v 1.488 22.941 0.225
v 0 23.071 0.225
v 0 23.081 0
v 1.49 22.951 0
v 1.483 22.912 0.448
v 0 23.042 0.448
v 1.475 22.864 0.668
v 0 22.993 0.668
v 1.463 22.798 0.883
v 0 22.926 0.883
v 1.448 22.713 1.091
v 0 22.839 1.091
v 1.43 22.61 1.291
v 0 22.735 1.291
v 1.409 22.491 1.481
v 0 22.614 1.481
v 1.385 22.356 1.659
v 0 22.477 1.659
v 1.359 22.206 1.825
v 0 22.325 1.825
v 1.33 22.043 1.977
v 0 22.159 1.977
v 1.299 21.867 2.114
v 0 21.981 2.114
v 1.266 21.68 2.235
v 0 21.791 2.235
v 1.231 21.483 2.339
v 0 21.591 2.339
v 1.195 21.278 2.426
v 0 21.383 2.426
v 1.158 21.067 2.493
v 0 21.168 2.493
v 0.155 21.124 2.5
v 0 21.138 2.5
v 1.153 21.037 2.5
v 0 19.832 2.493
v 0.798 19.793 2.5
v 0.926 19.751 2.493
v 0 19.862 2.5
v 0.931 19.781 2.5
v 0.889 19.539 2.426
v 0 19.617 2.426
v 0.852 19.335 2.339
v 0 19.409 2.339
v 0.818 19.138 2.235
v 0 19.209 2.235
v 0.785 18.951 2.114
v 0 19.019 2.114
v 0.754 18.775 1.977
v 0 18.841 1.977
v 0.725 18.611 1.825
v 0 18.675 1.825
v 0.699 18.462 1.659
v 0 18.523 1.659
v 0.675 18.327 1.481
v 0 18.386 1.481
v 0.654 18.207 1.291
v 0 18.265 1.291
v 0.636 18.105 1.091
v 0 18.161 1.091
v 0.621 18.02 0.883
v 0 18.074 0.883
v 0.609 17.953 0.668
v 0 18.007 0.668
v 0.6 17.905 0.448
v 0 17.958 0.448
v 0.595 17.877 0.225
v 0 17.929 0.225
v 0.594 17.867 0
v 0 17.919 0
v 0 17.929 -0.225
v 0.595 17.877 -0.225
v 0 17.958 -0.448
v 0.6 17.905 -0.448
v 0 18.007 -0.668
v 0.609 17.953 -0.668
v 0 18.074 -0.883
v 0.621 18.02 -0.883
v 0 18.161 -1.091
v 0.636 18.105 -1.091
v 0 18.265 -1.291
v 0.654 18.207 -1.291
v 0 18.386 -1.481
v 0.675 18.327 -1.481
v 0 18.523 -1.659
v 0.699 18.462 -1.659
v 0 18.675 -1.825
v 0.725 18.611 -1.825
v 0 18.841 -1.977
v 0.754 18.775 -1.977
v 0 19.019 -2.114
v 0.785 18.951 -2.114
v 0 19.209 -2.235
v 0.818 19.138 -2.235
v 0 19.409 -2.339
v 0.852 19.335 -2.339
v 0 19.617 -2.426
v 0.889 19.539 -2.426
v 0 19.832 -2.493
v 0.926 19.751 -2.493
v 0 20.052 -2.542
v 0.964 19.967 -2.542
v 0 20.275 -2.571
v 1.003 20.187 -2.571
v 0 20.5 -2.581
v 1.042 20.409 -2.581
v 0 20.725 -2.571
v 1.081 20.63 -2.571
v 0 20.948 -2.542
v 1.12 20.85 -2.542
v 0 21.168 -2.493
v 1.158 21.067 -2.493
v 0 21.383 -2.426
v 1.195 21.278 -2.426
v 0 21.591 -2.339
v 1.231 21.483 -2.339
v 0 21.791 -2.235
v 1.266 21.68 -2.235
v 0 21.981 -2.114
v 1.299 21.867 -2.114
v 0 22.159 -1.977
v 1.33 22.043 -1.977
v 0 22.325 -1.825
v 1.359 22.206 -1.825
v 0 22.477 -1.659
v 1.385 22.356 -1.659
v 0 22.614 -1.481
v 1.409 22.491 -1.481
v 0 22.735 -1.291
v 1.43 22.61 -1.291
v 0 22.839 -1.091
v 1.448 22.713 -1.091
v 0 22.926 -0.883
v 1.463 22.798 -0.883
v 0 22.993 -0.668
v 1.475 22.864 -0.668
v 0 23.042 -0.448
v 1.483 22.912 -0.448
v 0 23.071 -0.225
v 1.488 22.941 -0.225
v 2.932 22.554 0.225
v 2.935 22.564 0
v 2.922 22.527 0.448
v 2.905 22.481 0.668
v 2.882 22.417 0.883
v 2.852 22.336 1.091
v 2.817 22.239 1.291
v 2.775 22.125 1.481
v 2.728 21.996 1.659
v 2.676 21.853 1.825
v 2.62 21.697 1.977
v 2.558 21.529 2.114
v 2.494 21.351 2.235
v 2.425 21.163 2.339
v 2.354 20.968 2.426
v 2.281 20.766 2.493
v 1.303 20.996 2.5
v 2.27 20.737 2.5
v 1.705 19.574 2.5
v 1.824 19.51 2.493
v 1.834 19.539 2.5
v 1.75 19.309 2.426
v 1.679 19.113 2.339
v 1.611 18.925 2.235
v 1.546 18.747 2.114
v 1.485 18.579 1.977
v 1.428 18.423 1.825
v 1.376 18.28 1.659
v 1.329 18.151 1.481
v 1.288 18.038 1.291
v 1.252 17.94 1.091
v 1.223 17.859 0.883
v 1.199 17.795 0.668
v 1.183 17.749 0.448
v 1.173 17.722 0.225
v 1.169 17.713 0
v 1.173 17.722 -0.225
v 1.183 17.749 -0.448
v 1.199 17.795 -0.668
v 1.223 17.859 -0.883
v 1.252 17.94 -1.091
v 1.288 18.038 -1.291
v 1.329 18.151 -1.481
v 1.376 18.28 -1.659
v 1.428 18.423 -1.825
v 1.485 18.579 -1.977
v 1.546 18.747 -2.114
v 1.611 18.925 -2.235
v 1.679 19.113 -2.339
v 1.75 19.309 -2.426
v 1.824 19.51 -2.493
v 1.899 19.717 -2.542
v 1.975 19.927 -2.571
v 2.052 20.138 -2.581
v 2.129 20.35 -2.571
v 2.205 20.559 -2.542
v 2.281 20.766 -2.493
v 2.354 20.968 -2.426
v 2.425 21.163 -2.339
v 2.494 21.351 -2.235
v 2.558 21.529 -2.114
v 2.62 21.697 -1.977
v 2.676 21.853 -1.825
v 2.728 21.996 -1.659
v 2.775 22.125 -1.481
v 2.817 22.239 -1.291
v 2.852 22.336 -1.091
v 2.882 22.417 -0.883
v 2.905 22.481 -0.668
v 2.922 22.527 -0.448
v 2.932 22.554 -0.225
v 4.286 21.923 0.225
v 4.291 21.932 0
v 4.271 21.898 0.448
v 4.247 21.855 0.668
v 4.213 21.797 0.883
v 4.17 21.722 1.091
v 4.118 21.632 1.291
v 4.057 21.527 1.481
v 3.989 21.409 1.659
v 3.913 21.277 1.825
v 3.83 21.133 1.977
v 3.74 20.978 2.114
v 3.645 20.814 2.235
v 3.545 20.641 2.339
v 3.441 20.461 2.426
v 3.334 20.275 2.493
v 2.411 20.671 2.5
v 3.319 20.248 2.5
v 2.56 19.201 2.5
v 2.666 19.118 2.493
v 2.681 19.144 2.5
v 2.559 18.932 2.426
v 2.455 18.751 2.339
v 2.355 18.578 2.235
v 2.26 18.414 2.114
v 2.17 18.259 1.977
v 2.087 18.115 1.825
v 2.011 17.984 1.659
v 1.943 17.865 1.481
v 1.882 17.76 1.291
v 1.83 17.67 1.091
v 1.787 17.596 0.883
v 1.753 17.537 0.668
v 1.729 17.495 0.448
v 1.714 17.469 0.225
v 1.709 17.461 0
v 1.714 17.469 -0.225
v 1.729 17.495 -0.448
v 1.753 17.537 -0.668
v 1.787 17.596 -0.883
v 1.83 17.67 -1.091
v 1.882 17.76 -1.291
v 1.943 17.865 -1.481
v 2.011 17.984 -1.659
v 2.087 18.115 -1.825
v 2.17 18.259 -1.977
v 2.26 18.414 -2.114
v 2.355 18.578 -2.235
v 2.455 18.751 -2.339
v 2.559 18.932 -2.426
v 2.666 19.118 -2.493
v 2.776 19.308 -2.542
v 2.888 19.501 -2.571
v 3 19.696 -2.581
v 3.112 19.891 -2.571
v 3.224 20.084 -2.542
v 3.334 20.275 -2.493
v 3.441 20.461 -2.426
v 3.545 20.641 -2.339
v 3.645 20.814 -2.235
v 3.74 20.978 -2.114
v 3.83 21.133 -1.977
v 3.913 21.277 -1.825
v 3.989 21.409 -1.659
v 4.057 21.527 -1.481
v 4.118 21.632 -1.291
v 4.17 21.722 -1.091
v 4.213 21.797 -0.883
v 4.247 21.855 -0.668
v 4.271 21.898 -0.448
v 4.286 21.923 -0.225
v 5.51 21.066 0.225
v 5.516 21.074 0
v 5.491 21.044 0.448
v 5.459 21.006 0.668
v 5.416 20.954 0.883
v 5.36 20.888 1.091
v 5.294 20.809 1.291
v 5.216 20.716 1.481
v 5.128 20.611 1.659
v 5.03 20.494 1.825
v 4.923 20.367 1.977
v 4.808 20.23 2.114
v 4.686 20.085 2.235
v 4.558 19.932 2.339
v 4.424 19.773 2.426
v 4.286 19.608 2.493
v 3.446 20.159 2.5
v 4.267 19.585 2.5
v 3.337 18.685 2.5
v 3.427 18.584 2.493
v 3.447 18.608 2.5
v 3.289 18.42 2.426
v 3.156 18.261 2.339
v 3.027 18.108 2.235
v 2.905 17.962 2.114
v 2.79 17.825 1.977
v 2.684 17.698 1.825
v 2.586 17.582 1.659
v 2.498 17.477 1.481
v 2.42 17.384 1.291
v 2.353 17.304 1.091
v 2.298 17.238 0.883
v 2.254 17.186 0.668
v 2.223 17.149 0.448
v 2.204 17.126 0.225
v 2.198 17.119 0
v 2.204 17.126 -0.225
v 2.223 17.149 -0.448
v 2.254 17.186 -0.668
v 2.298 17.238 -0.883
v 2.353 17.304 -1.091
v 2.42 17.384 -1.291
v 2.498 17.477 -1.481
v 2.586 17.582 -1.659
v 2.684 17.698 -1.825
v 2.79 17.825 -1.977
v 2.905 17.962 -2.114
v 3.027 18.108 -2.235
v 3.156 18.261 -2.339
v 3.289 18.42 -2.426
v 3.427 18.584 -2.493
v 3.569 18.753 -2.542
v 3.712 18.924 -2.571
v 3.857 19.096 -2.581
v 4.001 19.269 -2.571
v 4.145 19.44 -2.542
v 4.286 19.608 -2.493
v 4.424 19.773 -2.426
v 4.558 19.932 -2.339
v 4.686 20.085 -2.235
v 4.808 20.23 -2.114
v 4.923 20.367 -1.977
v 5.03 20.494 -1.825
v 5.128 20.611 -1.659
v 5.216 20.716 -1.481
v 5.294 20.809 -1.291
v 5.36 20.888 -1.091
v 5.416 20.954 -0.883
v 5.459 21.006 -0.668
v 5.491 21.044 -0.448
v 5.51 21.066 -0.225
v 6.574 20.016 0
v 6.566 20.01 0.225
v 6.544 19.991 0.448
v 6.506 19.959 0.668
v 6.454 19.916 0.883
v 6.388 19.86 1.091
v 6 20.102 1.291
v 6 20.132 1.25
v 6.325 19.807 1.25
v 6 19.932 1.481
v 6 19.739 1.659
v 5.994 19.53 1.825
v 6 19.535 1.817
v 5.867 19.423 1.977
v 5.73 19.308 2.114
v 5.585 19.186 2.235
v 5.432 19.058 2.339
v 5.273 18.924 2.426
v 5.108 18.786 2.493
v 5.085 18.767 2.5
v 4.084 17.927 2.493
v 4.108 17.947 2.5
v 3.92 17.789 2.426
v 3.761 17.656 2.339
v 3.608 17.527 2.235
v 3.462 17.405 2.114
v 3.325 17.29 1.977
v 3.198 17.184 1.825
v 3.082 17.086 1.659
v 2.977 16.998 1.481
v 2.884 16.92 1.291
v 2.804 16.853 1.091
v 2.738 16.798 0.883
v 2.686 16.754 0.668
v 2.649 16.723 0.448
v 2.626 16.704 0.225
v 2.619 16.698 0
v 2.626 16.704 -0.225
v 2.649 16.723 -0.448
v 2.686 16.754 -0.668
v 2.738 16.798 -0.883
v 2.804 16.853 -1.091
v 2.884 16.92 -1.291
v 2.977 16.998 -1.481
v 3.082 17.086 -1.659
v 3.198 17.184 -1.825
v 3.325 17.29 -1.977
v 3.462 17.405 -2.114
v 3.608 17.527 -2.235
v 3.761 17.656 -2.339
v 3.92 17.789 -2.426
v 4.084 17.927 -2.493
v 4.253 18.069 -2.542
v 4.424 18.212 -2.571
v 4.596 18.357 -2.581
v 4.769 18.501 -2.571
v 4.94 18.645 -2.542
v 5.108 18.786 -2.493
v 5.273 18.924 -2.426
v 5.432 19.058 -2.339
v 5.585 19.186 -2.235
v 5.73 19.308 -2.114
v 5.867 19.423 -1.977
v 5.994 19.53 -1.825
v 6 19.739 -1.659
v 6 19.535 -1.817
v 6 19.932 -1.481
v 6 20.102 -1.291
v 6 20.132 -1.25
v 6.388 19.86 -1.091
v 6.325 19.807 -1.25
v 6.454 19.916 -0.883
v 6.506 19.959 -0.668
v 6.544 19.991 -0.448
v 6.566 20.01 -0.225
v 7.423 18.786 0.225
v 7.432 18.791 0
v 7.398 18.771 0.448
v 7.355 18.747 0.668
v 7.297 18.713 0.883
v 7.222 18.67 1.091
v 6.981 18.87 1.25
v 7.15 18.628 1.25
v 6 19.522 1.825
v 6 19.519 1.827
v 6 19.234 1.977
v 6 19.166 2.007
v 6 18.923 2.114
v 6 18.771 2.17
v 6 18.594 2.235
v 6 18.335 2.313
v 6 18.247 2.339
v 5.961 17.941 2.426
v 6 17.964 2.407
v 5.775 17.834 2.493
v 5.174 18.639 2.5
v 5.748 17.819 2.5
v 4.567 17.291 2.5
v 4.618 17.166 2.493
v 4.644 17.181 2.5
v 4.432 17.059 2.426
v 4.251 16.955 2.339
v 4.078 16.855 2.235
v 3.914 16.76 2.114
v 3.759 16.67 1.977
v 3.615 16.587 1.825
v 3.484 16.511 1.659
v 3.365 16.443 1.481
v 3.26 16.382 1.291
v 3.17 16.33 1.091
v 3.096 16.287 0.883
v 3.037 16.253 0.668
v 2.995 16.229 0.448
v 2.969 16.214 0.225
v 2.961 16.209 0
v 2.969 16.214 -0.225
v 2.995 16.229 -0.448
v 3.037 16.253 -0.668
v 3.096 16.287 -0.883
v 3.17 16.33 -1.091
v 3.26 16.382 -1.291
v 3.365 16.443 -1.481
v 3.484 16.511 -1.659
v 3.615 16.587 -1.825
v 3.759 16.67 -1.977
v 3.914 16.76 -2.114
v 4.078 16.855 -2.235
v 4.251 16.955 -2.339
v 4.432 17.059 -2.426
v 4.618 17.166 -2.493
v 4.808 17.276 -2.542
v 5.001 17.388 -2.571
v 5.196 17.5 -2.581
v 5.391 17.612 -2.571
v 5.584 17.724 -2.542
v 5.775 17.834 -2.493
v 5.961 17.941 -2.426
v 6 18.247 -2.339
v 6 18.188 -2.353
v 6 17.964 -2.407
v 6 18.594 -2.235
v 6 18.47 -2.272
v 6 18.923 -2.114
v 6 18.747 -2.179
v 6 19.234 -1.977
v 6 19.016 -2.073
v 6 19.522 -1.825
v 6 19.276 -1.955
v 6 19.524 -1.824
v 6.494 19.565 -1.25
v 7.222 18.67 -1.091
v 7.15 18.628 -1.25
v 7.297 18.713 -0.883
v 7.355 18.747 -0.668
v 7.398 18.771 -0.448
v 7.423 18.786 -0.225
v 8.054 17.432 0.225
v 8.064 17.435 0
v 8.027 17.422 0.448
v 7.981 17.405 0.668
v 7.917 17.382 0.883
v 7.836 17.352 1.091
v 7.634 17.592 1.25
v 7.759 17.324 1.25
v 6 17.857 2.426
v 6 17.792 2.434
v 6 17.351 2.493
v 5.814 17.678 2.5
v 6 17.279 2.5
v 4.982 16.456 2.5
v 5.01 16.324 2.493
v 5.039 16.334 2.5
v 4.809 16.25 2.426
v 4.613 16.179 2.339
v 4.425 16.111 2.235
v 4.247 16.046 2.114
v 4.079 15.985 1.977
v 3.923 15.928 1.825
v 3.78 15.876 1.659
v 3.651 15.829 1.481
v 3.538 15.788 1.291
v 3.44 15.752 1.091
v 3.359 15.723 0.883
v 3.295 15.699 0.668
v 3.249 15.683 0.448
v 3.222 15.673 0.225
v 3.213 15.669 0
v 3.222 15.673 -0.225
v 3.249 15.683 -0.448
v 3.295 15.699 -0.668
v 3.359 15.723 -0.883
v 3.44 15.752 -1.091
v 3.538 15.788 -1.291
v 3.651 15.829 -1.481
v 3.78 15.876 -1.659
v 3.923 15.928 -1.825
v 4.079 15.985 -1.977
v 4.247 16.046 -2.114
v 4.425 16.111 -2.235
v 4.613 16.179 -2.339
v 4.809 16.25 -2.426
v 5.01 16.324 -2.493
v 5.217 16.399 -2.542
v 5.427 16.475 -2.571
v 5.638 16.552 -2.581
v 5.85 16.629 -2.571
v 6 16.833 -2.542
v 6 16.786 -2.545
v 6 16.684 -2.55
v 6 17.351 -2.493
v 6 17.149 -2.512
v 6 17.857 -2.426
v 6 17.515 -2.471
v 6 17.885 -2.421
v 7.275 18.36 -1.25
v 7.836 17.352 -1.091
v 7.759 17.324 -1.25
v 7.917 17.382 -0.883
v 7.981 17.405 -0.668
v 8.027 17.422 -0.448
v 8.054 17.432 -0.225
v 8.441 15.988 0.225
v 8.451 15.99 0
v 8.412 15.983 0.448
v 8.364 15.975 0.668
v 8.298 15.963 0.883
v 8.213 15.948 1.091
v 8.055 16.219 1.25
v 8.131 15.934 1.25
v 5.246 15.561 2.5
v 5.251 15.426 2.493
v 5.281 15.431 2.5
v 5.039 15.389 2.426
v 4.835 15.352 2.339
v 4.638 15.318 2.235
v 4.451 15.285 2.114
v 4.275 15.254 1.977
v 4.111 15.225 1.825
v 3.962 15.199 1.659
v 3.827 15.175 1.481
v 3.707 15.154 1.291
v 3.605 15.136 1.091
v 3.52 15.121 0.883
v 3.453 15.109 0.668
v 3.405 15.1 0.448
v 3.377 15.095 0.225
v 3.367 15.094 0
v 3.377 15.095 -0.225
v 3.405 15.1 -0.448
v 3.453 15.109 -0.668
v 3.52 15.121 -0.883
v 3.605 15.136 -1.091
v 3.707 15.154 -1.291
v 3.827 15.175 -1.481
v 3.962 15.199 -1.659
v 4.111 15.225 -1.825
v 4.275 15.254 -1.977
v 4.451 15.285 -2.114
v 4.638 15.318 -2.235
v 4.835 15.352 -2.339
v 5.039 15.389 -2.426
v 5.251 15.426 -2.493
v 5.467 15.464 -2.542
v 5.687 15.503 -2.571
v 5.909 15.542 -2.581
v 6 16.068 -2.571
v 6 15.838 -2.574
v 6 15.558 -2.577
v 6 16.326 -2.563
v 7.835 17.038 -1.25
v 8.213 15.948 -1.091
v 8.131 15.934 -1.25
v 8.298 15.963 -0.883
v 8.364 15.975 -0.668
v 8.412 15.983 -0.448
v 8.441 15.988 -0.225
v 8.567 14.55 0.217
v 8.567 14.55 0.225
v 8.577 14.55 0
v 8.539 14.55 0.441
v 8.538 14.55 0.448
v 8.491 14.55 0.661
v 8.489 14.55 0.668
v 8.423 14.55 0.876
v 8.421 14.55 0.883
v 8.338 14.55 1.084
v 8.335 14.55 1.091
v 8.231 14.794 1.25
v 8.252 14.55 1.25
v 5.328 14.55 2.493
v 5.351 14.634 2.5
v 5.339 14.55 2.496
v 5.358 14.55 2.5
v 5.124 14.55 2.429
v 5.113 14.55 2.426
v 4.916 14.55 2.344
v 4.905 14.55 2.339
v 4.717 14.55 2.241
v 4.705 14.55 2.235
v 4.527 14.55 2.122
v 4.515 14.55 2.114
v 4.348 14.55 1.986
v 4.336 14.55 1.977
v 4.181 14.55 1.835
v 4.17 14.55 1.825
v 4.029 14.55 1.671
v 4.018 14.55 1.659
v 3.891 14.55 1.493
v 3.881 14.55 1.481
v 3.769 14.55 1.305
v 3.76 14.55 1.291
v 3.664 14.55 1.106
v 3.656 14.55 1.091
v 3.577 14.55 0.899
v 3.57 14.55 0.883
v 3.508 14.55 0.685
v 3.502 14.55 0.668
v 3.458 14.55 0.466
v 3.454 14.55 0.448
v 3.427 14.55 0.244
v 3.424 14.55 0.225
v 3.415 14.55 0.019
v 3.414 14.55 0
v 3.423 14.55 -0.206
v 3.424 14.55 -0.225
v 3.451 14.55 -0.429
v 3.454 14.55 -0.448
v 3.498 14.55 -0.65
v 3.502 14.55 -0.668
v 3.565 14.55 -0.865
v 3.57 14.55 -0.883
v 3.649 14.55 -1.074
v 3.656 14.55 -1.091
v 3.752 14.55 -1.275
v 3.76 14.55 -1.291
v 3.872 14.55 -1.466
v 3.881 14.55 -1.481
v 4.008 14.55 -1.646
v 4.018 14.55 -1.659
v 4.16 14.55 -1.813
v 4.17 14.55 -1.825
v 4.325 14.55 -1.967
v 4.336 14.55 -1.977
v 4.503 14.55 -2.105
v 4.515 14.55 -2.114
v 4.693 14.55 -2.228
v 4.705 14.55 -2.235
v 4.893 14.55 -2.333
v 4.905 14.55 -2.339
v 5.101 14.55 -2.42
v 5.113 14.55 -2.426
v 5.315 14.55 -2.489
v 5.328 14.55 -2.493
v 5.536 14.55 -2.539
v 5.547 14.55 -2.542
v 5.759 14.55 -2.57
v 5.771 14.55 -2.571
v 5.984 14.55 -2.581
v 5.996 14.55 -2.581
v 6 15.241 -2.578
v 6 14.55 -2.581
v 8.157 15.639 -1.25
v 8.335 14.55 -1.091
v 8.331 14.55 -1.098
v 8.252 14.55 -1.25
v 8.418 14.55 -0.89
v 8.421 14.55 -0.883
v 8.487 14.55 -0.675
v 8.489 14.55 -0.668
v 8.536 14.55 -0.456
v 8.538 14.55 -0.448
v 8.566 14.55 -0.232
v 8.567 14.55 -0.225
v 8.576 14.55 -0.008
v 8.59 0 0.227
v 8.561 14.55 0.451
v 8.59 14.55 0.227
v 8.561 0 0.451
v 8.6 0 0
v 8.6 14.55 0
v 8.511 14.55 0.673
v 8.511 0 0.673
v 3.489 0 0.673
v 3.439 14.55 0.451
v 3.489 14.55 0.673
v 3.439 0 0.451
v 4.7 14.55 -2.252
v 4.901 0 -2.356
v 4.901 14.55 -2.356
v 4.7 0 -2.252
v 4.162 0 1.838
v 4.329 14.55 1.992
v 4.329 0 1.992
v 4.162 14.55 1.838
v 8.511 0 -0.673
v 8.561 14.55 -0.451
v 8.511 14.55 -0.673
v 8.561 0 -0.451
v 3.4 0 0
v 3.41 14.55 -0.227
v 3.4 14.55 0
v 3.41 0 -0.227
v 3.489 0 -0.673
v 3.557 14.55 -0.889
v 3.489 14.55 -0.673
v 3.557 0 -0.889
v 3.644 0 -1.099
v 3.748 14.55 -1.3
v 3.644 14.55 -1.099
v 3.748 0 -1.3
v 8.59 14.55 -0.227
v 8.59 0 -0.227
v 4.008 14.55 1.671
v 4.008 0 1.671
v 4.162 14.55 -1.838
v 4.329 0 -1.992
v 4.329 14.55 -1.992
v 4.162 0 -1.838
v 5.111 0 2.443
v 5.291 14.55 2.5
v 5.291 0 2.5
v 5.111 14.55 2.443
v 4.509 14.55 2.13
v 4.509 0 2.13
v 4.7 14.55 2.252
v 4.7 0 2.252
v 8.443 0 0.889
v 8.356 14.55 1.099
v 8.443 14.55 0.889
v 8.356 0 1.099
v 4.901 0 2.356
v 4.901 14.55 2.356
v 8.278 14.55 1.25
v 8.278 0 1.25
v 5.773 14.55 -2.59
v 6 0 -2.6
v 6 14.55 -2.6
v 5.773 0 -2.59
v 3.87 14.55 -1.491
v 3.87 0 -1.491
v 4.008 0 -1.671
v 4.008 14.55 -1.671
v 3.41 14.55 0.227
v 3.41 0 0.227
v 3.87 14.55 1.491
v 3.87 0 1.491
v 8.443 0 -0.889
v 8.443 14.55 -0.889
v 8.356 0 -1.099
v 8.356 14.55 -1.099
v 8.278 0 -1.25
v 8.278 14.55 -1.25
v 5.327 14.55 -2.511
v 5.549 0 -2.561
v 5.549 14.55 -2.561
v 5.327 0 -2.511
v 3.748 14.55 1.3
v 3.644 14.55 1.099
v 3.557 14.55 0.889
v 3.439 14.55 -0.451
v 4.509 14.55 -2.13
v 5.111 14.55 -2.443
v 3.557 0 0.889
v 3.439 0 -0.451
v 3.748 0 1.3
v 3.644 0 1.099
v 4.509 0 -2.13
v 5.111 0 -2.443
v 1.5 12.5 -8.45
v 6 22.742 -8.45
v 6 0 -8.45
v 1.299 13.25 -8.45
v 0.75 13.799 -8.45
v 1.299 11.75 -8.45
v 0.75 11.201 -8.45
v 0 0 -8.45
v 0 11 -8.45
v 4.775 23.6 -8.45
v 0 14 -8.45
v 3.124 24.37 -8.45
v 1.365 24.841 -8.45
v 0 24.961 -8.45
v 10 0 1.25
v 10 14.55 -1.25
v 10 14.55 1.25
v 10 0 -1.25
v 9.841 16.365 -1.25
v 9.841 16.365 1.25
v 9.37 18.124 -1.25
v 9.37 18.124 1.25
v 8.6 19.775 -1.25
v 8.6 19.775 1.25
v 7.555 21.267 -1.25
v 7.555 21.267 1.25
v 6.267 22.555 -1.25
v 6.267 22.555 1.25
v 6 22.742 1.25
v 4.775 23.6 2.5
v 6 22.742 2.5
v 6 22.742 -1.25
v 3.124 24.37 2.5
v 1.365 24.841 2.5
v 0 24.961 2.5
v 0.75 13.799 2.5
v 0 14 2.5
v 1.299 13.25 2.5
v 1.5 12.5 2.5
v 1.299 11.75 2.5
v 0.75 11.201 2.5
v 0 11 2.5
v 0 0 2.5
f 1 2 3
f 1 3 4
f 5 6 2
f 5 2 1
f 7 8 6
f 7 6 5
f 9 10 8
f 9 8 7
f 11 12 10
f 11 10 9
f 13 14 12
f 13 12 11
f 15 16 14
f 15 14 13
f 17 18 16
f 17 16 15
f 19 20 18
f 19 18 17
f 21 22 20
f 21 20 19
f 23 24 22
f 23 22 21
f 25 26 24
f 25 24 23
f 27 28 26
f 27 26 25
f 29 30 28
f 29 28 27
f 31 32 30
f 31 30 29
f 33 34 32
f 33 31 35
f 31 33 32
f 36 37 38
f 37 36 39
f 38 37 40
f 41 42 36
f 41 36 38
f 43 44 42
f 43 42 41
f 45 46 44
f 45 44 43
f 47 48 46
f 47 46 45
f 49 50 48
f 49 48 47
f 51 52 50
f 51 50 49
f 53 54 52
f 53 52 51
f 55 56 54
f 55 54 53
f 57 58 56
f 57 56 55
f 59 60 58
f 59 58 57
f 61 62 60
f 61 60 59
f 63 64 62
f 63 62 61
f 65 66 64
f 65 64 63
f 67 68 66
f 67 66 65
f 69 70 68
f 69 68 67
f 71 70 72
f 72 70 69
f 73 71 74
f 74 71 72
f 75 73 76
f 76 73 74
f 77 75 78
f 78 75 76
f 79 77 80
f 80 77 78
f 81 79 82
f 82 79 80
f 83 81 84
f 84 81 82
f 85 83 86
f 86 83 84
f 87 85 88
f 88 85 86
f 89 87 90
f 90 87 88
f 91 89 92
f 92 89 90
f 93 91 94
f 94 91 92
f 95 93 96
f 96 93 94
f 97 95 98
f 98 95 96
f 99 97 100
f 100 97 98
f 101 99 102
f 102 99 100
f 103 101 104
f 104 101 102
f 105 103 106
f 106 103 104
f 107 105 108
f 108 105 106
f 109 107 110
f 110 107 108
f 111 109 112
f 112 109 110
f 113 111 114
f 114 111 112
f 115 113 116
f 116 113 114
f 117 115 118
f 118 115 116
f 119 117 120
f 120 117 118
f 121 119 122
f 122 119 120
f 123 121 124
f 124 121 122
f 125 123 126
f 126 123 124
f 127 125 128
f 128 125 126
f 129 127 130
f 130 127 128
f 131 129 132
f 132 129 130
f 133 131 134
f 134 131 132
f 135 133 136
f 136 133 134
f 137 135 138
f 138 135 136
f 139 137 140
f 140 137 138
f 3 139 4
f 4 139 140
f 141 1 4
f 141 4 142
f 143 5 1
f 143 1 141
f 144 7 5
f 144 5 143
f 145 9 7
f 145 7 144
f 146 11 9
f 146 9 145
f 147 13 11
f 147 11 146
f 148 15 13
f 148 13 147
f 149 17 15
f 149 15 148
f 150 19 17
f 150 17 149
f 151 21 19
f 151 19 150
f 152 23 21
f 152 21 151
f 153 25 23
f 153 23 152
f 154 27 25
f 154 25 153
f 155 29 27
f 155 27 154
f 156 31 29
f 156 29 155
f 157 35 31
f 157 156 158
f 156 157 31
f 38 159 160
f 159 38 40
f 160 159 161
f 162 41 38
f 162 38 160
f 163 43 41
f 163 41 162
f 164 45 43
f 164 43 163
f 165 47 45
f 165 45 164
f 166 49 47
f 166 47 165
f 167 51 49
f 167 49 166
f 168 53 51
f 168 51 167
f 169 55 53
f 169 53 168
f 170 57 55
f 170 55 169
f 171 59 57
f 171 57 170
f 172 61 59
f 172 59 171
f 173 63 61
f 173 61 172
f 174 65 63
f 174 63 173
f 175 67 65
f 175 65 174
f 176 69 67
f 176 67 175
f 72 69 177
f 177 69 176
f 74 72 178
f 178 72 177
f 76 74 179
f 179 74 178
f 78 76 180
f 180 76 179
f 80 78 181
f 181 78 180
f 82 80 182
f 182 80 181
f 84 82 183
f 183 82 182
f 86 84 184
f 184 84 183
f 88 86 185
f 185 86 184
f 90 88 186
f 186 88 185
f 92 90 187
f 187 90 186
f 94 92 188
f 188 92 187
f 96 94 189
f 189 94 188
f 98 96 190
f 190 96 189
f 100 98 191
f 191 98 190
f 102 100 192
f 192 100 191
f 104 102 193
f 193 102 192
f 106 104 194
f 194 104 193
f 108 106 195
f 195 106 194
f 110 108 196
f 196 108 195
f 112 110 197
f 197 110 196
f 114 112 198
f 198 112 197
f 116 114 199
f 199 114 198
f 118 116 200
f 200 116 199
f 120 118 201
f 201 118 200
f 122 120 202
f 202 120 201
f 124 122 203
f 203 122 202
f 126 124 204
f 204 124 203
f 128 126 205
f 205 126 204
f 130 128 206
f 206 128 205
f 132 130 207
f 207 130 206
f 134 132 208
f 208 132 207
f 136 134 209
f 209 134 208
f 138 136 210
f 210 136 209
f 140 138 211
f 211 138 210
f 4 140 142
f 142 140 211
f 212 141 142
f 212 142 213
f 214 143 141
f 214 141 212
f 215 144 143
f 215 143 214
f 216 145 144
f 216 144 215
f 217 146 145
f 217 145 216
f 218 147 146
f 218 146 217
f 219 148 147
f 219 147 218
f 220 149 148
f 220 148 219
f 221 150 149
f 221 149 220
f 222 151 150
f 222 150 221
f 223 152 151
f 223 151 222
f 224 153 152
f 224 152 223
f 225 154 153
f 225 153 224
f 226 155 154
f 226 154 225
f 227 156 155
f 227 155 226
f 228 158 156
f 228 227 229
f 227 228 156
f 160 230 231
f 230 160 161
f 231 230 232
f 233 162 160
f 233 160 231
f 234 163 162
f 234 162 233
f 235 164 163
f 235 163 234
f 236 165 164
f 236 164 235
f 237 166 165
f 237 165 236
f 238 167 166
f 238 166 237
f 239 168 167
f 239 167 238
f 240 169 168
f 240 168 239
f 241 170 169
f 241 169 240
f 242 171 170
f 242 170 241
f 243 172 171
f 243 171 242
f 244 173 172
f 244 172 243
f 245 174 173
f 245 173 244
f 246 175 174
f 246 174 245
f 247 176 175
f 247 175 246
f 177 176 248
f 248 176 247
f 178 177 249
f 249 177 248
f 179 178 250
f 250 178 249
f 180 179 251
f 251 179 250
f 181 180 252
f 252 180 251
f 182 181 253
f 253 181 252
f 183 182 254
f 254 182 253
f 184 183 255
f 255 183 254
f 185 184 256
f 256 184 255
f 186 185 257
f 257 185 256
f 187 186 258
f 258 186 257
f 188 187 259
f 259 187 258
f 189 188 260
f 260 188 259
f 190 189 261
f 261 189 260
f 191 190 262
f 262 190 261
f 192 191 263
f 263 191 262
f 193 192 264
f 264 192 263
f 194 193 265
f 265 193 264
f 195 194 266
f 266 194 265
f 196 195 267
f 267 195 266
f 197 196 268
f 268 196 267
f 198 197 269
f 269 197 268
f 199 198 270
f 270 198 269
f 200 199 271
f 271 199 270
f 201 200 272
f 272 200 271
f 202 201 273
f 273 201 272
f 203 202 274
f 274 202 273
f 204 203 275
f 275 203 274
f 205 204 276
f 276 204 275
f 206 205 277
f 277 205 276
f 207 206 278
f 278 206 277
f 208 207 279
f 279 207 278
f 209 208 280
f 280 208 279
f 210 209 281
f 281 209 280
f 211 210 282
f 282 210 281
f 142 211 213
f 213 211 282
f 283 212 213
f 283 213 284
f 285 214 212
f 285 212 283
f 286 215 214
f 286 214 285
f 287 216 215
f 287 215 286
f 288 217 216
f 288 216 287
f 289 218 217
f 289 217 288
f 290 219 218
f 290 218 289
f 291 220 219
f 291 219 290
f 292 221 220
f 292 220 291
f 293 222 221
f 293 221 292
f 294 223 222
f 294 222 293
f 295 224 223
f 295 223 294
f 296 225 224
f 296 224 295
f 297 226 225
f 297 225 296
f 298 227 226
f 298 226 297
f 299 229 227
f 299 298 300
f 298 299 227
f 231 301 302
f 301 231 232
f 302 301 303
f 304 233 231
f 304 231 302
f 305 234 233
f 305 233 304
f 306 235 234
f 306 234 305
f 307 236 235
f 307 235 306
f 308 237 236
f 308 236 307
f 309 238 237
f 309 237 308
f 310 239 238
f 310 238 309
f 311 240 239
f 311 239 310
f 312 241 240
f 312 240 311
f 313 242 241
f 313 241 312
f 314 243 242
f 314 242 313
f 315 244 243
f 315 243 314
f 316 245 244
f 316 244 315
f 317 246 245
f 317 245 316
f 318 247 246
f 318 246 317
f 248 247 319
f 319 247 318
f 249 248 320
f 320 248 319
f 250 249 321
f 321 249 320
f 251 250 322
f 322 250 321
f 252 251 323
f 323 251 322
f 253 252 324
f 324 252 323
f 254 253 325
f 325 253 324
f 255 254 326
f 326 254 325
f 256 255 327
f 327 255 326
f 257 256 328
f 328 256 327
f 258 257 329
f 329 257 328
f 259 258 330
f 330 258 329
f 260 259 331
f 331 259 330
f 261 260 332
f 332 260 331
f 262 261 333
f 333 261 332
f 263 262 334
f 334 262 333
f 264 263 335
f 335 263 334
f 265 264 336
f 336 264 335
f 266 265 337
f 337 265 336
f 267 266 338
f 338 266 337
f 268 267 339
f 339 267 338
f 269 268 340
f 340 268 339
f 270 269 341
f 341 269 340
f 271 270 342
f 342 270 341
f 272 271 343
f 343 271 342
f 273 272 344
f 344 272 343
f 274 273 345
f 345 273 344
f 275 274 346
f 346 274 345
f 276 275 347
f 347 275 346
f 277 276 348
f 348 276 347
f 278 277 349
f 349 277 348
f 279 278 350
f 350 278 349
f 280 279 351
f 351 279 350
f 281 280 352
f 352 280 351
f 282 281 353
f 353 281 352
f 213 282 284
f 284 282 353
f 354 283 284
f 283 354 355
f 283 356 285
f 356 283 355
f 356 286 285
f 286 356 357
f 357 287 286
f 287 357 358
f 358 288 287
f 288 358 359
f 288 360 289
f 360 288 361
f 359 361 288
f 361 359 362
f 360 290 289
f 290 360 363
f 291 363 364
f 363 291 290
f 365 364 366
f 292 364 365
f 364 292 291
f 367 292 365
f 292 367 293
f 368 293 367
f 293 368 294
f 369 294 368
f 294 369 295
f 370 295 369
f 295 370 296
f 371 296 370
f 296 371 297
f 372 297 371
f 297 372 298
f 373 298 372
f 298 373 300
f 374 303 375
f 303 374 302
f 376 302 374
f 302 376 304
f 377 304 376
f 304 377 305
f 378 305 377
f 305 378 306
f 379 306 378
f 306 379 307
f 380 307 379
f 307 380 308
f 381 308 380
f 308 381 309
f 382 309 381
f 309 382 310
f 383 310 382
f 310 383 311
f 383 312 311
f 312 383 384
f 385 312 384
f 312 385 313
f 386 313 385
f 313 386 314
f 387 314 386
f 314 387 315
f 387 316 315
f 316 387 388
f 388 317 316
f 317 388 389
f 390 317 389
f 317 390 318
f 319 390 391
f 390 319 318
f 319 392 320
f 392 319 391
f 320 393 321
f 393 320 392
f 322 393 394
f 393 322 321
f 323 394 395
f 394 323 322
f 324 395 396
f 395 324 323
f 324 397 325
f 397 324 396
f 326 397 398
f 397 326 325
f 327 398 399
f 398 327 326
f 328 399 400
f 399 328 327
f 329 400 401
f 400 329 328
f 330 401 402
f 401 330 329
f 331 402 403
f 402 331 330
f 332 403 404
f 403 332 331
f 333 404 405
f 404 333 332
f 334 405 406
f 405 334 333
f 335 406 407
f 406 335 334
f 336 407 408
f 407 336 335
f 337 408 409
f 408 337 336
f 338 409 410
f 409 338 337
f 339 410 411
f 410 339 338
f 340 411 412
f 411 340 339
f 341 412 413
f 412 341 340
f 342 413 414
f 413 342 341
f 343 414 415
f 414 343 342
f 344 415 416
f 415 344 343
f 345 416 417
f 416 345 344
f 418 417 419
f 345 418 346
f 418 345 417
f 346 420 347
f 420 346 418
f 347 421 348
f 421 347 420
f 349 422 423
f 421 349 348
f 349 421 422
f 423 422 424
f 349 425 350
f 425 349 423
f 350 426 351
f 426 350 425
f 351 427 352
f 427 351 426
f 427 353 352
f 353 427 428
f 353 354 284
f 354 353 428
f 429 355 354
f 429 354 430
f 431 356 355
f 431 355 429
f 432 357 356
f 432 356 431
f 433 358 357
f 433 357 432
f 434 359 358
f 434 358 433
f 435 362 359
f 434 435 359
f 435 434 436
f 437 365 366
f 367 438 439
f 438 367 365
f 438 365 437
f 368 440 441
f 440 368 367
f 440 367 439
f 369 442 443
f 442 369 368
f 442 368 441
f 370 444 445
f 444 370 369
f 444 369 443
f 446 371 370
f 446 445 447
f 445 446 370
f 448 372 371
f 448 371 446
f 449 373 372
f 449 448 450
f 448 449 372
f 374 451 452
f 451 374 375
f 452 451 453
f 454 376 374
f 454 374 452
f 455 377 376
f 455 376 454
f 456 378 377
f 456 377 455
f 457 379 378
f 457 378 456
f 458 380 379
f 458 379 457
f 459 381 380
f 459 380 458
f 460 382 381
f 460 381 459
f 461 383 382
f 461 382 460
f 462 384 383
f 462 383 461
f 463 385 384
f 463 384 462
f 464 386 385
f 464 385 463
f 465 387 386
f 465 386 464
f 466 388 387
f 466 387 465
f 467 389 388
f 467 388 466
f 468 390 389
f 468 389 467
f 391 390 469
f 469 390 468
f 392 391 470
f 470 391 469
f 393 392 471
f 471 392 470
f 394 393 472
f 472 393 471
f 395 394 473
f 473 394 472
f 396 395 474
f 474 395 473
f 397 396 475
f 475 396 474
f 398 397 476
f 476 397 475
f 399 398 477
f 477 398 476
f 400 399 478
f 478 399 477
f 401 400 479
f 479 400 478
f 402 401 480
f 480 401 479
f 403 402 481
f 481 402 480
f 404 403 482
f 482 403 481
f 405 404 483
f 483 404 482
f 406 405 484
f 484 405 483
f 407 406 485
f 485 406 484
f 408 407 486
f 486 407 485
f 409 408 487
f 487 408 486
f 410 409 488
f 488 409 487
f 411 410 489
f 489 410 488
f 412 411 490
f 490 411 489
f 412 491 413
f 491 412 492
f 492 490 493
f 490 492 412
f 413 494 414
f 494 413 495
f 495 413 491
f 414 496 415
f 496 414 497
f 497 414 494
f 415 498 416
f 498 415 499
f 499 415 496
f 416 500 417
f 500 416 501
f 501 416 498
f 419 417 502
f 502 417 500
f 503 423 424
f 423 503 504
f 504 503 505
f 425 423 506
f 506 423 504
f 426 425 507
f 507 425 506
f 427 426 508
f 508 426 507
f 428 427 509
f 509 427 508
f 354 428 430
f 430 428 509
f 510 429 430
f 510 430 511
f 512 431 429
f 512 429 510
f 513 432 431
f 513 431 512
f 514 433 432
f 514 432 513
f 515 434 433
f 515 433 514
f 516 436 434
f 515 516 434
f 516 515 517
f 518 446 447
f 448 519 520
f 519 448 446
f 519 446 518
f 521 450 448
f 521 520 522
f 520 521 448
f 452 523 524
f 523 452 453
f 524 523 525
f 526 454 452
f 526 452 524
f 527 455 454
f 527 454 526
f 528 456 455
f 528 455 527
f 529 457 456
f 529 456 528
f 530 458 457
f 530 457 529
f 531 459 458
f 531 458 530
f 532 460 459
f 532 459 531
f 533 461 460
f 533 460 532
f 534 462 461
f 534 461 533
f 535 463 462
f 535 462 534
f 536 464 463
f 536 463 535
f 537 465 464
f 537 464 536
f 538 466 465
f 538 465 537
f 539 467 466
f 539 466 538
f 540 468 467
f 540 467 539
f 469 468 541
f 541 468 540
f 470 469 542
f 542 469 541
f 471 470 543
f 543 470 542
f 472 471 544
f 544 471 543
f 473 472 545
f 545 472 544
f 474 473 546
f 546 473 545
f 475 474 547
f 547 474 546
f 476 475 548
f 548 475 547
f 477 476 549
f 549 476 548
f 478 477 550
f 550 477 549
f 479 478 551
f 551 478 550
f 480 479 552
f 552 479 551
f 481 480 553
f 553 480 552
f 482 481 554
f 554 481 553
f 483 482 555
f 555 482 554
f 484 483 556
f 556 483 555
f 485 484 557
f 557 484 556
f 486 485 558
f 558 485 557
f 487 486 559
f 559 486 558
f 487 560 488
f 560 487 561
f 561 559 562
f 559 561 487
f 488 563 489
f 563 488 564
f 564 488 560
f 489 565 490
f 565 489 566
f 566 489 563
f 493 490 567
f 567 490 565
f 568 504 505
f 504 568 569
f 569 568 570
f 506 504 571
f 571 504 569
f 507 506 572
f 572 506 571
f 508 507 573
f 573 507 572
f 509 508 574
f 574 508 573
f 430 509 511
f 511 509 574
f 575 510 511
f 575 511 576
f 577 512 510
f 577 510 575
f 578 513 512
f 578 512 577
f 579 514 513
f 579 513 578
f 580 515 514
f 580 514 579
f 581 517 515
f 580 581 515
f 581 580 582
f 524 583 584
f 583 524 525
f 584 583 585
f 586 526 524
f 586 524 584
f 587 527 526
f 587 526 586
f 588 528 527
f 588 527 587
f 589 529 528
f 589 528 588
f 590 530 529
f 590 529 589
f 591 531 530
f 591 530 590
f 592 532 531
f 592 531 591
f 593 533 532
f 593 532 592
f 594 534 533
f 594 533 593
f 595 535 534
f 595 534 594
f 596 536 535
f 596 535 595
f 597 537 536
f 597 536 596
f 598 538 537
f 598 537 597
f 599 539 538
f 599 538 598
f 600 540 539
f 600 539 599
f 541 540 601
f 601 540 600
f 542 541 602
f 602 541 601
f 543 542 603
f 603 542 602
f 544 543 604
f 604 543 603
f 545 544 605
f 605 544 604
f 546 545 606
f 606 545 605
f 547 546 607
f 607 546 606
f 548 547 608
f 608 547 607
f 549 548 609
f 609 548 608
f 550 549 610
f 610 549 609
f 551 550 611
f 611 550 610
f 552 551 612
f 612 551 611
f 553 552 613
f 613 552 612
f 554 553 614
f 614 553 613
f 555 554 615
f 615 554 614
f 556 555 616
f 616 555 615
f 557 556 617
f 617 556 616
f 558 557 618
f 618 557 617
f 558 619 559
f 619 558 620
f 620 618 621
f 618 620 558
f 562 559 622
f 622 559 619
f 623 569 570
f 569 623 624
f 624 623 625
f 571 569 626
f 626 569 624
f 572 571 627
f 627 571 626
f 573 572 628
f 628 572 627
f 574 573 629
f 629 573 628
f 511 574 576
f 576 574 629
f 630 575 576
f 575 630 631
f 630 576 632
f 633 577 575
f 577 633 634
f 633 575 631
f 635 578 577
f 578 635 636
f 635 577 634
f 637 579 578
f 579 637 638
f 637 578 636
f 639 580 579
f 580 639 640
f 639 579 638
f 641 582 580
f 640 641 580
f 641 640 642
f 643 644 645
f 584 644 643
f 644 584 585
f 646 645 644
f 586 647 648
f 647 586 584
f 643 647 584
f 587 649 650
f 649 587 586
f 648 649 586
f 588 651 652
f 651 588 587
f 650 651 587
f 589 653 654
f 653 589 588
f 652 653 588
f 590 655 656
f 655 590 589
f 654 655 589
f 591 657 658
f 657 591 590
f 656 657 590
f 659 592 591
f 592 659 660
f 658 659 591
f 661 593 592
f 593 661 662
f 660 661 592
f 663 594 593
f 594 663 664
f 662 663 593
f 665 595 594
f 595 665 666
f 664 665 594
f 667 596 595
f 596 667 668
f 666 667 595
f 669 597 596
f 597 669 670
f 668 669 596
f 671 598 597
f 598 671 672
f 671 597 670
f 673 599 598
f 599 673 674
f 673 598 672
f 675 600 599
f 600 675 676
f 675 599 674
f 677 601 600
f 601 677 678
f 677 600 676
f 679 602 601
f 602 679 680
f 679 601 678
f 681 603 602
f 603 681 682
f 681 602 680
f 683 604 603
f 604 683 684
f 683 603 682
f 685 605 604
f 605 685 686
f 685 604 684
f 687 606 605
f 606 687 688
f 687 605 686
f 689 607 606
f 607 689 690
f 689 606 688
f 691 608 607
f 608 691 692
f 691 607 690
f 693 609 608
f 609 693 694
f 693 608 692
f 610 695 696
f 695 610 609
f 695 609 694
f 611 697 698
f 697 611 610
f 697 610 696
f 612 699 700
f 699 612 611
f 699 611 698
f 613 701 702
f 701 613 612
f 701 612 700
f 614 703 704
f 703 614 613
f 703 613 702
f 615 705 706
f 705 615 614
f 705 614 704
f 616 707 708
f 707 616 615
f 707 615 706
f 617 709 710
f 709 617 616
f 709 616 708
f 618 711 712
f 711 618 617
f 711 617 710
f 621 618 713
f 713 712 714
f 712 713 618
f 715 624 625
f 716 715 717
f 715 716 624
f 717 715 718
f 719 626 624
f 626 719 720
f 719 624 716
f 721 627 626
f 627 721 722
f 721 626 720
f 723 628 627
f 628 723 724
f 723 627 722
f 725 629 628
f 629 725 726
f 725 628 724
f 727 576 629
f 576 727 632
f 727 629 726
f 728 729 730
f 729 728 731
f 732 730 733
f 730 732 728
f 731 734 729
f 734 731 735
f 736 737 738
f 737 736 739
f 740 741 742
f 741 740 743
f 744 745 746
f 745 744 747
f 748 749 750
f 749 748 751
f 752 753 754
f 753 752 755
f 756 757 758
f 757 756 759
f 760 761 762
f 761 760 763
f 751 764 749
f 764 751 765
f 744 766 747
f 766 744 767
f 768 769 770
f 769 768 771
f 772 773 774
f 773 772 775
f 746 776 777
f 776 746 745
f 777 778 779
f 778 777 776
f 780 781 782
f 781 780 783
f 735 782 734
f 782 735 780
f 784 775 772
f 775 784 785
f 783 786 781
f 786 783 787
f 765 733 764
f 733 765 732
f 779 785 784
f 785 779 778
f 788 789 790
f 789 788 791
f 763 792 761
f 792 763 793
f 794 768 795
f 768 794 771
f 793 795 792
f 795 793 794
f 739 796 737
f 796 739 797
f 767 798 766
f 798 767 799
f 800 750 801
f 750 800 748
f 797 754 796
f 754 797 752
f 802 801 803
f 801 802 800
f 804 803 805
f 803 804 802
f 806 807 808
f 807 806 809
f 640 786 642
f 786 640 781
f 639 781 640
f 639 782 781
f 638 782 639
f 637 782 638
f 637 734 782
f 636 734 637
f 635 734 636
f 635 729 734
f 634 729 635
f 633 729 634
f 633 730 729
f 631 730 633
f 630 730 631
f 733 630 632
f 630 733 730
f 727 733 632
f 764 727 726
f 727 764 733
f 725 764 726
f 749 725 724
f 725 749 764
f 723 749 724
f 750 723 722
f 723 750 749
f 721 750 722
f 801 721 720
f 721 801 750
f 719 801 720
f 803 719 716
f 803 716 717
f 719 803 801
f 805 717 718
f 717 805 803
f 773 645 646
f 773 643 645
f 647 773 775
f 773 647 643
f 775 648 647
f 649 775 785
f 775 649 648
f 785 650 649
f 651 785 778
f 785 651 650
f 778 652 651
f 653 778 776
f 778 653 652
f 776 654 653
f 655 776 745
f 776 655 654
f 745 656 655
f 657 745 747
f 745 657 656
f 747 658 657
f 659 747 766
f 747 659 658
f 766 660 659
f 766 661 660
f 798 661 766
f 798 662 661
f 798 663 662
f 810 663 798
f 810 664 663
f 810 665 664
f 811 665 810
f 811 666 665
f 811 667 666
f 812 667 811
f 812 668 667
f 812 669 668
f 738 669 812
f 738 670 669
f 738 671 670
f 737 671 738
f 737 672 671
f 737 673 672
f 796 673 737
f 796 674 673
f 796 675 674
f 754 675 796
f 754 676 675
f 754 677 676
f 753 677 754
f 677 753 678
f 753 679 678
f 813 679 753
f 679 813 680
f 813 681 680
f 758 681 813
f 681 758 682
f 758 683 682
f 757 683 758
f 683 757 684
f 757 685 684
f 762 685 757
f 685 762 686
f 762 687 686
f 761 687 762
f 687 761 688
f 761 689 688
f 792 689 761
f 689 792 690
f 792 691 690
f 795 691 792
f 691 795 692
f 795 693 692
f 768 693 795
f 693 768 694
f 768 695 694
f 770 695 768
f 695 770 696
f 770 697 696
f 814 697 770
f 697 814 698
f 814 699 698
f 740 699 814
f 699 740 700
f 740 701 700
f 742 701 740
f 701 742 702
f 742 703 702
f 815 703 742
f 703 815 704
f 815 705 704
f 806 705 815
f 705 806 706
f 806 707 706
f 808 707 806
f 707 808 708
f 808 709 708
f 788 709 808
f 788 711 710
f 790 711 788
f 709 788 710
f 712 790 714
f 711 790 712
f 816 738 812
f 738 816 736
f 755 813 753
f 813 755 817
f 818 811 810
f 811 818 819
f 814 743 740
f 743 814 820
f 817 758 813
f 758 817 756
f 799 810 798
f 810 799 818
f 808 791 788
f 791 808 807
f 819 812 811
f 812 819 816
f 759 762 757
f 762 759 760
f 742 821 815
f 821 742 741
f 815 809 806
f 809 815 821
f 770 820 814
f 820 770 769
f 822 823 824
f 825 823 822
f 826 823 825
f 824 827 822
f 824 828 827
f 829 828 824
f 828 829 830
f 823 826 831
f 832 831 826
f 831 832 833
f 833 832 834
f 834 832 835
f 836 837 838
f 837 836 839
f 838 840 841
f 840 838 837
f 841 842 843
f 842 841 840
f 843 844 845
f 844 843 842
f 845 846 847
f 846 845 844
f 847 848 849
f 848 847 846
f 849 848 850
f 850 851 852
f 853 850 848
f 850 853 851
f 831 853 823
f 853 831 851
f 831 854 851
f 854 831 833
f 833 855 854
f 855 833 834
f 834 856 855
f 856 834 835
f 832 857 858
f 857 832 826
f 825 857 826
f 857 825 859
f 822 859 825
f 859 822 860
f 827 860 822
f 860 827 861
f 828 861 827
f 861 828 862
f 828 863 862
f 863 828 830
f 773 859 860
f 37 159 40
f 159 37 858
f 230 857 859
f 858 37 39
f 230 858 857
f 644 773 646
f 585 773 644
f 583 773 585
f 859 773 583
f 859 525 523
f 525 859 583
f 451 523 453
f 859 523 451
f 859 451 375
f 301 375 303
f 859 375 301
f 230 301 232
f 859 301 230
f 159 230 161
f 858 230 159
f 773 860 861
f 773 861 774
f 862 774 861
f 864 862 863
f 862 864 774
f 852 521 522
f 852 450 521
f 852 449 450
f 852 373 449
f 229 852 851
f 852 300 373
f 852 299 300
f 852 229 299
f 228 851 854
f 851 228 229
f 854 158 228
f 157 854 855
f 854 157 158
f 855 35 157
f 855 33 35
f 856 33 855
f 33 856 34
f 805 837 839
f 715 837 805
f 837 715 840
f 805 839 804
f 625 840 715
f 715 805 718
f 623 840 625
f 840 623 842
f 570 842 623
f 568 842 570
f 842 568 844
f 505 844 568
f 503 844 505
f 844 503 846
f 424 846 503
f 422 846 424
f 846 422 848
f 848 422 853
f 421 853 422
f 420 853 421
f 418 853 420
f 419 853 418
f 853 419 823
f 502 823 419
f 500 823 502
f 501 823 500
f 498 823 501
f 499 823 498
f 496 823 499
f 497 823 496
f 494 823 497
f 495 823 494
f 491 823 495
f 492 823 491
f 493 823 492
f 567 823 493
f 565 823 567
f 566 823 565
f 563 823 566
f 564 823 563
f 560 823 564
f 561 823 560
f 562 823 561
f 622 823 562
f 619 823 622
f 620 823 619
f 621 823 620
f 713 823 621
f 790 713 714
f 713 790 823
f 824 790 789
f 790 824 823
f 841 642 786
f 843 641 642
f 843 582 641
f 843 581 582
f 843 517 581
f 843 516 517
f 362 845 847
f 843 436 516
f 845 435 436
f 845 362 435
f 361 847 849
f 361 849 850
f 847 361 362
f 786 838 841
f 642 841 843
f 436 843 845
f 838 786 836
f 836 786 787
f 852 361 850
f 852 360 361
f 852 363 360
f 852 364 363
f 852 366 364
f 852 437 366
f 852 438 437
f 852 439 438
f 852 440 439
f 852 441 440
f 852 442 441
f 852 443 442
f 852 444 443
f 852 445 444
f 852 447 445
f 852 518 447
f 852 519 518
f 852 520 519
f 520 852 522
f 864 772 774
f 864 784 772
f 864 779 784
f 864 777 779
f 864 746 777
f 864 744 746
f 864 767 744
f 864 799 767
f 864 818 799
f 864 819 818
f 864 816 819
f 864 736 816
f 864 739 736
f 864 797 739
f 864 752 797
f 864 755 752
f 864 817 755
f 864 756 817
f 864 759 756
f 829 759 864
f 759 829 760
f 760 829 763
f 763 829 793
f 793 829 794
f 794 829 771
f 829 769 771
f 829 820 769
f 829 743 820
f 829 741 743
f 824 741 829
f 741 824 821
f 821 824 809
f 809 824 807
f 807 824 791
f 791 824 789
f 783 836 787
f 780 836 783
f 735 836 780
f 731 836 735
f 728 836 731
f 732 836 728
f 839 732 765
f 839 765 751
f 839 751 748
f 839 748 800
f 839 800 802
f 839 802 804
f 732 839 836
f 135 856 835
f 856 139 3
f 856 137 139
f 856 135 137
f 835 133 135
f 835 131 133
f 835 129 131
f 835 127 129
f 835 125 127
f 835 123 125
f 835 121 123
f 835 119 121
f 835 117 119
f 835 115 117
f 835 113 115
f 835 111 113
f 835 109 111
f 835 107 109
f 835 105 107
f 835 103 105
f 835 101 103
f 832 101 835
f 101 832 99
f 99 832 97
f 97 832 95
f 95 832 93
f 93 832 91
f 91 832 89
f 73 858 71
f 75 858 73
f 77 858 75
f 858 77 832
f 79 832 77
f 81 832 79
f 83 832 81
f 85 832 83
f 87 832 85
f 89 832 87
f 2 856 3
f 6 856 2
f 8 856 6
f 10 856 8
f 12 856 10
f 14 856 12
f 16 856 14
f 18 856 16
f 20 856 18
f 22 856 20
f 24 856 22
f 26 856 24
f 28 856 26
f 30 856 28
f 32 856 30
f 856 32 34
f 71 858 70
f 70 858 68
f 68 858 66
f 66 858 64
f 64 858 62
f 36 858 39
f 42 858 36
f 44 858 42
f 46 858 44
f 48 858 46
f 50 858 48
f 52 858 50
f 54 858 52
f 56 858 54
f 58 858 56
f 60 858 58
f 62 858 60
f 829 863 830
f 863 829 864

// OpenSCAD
include <recirculating_mw.scad>
difference() {
    half(6.0);
    translate([0, -20, 0]) cube([40, 40, 40], center=true);
    translate([-20, 0, 0]) cube([40, 60, 40], center=true);
}

/* translate([29, 0, 0]) rotate([0,0,180]) % half(6);
// extrusion
xwid = 15;
translate([xwid/2, -50, -xwid/2]) 
   % cube([15, 100, 15]);
// carriage plate
translate([15,0,-thickness+slot])
   % recirc_plate(14.5);
 */
